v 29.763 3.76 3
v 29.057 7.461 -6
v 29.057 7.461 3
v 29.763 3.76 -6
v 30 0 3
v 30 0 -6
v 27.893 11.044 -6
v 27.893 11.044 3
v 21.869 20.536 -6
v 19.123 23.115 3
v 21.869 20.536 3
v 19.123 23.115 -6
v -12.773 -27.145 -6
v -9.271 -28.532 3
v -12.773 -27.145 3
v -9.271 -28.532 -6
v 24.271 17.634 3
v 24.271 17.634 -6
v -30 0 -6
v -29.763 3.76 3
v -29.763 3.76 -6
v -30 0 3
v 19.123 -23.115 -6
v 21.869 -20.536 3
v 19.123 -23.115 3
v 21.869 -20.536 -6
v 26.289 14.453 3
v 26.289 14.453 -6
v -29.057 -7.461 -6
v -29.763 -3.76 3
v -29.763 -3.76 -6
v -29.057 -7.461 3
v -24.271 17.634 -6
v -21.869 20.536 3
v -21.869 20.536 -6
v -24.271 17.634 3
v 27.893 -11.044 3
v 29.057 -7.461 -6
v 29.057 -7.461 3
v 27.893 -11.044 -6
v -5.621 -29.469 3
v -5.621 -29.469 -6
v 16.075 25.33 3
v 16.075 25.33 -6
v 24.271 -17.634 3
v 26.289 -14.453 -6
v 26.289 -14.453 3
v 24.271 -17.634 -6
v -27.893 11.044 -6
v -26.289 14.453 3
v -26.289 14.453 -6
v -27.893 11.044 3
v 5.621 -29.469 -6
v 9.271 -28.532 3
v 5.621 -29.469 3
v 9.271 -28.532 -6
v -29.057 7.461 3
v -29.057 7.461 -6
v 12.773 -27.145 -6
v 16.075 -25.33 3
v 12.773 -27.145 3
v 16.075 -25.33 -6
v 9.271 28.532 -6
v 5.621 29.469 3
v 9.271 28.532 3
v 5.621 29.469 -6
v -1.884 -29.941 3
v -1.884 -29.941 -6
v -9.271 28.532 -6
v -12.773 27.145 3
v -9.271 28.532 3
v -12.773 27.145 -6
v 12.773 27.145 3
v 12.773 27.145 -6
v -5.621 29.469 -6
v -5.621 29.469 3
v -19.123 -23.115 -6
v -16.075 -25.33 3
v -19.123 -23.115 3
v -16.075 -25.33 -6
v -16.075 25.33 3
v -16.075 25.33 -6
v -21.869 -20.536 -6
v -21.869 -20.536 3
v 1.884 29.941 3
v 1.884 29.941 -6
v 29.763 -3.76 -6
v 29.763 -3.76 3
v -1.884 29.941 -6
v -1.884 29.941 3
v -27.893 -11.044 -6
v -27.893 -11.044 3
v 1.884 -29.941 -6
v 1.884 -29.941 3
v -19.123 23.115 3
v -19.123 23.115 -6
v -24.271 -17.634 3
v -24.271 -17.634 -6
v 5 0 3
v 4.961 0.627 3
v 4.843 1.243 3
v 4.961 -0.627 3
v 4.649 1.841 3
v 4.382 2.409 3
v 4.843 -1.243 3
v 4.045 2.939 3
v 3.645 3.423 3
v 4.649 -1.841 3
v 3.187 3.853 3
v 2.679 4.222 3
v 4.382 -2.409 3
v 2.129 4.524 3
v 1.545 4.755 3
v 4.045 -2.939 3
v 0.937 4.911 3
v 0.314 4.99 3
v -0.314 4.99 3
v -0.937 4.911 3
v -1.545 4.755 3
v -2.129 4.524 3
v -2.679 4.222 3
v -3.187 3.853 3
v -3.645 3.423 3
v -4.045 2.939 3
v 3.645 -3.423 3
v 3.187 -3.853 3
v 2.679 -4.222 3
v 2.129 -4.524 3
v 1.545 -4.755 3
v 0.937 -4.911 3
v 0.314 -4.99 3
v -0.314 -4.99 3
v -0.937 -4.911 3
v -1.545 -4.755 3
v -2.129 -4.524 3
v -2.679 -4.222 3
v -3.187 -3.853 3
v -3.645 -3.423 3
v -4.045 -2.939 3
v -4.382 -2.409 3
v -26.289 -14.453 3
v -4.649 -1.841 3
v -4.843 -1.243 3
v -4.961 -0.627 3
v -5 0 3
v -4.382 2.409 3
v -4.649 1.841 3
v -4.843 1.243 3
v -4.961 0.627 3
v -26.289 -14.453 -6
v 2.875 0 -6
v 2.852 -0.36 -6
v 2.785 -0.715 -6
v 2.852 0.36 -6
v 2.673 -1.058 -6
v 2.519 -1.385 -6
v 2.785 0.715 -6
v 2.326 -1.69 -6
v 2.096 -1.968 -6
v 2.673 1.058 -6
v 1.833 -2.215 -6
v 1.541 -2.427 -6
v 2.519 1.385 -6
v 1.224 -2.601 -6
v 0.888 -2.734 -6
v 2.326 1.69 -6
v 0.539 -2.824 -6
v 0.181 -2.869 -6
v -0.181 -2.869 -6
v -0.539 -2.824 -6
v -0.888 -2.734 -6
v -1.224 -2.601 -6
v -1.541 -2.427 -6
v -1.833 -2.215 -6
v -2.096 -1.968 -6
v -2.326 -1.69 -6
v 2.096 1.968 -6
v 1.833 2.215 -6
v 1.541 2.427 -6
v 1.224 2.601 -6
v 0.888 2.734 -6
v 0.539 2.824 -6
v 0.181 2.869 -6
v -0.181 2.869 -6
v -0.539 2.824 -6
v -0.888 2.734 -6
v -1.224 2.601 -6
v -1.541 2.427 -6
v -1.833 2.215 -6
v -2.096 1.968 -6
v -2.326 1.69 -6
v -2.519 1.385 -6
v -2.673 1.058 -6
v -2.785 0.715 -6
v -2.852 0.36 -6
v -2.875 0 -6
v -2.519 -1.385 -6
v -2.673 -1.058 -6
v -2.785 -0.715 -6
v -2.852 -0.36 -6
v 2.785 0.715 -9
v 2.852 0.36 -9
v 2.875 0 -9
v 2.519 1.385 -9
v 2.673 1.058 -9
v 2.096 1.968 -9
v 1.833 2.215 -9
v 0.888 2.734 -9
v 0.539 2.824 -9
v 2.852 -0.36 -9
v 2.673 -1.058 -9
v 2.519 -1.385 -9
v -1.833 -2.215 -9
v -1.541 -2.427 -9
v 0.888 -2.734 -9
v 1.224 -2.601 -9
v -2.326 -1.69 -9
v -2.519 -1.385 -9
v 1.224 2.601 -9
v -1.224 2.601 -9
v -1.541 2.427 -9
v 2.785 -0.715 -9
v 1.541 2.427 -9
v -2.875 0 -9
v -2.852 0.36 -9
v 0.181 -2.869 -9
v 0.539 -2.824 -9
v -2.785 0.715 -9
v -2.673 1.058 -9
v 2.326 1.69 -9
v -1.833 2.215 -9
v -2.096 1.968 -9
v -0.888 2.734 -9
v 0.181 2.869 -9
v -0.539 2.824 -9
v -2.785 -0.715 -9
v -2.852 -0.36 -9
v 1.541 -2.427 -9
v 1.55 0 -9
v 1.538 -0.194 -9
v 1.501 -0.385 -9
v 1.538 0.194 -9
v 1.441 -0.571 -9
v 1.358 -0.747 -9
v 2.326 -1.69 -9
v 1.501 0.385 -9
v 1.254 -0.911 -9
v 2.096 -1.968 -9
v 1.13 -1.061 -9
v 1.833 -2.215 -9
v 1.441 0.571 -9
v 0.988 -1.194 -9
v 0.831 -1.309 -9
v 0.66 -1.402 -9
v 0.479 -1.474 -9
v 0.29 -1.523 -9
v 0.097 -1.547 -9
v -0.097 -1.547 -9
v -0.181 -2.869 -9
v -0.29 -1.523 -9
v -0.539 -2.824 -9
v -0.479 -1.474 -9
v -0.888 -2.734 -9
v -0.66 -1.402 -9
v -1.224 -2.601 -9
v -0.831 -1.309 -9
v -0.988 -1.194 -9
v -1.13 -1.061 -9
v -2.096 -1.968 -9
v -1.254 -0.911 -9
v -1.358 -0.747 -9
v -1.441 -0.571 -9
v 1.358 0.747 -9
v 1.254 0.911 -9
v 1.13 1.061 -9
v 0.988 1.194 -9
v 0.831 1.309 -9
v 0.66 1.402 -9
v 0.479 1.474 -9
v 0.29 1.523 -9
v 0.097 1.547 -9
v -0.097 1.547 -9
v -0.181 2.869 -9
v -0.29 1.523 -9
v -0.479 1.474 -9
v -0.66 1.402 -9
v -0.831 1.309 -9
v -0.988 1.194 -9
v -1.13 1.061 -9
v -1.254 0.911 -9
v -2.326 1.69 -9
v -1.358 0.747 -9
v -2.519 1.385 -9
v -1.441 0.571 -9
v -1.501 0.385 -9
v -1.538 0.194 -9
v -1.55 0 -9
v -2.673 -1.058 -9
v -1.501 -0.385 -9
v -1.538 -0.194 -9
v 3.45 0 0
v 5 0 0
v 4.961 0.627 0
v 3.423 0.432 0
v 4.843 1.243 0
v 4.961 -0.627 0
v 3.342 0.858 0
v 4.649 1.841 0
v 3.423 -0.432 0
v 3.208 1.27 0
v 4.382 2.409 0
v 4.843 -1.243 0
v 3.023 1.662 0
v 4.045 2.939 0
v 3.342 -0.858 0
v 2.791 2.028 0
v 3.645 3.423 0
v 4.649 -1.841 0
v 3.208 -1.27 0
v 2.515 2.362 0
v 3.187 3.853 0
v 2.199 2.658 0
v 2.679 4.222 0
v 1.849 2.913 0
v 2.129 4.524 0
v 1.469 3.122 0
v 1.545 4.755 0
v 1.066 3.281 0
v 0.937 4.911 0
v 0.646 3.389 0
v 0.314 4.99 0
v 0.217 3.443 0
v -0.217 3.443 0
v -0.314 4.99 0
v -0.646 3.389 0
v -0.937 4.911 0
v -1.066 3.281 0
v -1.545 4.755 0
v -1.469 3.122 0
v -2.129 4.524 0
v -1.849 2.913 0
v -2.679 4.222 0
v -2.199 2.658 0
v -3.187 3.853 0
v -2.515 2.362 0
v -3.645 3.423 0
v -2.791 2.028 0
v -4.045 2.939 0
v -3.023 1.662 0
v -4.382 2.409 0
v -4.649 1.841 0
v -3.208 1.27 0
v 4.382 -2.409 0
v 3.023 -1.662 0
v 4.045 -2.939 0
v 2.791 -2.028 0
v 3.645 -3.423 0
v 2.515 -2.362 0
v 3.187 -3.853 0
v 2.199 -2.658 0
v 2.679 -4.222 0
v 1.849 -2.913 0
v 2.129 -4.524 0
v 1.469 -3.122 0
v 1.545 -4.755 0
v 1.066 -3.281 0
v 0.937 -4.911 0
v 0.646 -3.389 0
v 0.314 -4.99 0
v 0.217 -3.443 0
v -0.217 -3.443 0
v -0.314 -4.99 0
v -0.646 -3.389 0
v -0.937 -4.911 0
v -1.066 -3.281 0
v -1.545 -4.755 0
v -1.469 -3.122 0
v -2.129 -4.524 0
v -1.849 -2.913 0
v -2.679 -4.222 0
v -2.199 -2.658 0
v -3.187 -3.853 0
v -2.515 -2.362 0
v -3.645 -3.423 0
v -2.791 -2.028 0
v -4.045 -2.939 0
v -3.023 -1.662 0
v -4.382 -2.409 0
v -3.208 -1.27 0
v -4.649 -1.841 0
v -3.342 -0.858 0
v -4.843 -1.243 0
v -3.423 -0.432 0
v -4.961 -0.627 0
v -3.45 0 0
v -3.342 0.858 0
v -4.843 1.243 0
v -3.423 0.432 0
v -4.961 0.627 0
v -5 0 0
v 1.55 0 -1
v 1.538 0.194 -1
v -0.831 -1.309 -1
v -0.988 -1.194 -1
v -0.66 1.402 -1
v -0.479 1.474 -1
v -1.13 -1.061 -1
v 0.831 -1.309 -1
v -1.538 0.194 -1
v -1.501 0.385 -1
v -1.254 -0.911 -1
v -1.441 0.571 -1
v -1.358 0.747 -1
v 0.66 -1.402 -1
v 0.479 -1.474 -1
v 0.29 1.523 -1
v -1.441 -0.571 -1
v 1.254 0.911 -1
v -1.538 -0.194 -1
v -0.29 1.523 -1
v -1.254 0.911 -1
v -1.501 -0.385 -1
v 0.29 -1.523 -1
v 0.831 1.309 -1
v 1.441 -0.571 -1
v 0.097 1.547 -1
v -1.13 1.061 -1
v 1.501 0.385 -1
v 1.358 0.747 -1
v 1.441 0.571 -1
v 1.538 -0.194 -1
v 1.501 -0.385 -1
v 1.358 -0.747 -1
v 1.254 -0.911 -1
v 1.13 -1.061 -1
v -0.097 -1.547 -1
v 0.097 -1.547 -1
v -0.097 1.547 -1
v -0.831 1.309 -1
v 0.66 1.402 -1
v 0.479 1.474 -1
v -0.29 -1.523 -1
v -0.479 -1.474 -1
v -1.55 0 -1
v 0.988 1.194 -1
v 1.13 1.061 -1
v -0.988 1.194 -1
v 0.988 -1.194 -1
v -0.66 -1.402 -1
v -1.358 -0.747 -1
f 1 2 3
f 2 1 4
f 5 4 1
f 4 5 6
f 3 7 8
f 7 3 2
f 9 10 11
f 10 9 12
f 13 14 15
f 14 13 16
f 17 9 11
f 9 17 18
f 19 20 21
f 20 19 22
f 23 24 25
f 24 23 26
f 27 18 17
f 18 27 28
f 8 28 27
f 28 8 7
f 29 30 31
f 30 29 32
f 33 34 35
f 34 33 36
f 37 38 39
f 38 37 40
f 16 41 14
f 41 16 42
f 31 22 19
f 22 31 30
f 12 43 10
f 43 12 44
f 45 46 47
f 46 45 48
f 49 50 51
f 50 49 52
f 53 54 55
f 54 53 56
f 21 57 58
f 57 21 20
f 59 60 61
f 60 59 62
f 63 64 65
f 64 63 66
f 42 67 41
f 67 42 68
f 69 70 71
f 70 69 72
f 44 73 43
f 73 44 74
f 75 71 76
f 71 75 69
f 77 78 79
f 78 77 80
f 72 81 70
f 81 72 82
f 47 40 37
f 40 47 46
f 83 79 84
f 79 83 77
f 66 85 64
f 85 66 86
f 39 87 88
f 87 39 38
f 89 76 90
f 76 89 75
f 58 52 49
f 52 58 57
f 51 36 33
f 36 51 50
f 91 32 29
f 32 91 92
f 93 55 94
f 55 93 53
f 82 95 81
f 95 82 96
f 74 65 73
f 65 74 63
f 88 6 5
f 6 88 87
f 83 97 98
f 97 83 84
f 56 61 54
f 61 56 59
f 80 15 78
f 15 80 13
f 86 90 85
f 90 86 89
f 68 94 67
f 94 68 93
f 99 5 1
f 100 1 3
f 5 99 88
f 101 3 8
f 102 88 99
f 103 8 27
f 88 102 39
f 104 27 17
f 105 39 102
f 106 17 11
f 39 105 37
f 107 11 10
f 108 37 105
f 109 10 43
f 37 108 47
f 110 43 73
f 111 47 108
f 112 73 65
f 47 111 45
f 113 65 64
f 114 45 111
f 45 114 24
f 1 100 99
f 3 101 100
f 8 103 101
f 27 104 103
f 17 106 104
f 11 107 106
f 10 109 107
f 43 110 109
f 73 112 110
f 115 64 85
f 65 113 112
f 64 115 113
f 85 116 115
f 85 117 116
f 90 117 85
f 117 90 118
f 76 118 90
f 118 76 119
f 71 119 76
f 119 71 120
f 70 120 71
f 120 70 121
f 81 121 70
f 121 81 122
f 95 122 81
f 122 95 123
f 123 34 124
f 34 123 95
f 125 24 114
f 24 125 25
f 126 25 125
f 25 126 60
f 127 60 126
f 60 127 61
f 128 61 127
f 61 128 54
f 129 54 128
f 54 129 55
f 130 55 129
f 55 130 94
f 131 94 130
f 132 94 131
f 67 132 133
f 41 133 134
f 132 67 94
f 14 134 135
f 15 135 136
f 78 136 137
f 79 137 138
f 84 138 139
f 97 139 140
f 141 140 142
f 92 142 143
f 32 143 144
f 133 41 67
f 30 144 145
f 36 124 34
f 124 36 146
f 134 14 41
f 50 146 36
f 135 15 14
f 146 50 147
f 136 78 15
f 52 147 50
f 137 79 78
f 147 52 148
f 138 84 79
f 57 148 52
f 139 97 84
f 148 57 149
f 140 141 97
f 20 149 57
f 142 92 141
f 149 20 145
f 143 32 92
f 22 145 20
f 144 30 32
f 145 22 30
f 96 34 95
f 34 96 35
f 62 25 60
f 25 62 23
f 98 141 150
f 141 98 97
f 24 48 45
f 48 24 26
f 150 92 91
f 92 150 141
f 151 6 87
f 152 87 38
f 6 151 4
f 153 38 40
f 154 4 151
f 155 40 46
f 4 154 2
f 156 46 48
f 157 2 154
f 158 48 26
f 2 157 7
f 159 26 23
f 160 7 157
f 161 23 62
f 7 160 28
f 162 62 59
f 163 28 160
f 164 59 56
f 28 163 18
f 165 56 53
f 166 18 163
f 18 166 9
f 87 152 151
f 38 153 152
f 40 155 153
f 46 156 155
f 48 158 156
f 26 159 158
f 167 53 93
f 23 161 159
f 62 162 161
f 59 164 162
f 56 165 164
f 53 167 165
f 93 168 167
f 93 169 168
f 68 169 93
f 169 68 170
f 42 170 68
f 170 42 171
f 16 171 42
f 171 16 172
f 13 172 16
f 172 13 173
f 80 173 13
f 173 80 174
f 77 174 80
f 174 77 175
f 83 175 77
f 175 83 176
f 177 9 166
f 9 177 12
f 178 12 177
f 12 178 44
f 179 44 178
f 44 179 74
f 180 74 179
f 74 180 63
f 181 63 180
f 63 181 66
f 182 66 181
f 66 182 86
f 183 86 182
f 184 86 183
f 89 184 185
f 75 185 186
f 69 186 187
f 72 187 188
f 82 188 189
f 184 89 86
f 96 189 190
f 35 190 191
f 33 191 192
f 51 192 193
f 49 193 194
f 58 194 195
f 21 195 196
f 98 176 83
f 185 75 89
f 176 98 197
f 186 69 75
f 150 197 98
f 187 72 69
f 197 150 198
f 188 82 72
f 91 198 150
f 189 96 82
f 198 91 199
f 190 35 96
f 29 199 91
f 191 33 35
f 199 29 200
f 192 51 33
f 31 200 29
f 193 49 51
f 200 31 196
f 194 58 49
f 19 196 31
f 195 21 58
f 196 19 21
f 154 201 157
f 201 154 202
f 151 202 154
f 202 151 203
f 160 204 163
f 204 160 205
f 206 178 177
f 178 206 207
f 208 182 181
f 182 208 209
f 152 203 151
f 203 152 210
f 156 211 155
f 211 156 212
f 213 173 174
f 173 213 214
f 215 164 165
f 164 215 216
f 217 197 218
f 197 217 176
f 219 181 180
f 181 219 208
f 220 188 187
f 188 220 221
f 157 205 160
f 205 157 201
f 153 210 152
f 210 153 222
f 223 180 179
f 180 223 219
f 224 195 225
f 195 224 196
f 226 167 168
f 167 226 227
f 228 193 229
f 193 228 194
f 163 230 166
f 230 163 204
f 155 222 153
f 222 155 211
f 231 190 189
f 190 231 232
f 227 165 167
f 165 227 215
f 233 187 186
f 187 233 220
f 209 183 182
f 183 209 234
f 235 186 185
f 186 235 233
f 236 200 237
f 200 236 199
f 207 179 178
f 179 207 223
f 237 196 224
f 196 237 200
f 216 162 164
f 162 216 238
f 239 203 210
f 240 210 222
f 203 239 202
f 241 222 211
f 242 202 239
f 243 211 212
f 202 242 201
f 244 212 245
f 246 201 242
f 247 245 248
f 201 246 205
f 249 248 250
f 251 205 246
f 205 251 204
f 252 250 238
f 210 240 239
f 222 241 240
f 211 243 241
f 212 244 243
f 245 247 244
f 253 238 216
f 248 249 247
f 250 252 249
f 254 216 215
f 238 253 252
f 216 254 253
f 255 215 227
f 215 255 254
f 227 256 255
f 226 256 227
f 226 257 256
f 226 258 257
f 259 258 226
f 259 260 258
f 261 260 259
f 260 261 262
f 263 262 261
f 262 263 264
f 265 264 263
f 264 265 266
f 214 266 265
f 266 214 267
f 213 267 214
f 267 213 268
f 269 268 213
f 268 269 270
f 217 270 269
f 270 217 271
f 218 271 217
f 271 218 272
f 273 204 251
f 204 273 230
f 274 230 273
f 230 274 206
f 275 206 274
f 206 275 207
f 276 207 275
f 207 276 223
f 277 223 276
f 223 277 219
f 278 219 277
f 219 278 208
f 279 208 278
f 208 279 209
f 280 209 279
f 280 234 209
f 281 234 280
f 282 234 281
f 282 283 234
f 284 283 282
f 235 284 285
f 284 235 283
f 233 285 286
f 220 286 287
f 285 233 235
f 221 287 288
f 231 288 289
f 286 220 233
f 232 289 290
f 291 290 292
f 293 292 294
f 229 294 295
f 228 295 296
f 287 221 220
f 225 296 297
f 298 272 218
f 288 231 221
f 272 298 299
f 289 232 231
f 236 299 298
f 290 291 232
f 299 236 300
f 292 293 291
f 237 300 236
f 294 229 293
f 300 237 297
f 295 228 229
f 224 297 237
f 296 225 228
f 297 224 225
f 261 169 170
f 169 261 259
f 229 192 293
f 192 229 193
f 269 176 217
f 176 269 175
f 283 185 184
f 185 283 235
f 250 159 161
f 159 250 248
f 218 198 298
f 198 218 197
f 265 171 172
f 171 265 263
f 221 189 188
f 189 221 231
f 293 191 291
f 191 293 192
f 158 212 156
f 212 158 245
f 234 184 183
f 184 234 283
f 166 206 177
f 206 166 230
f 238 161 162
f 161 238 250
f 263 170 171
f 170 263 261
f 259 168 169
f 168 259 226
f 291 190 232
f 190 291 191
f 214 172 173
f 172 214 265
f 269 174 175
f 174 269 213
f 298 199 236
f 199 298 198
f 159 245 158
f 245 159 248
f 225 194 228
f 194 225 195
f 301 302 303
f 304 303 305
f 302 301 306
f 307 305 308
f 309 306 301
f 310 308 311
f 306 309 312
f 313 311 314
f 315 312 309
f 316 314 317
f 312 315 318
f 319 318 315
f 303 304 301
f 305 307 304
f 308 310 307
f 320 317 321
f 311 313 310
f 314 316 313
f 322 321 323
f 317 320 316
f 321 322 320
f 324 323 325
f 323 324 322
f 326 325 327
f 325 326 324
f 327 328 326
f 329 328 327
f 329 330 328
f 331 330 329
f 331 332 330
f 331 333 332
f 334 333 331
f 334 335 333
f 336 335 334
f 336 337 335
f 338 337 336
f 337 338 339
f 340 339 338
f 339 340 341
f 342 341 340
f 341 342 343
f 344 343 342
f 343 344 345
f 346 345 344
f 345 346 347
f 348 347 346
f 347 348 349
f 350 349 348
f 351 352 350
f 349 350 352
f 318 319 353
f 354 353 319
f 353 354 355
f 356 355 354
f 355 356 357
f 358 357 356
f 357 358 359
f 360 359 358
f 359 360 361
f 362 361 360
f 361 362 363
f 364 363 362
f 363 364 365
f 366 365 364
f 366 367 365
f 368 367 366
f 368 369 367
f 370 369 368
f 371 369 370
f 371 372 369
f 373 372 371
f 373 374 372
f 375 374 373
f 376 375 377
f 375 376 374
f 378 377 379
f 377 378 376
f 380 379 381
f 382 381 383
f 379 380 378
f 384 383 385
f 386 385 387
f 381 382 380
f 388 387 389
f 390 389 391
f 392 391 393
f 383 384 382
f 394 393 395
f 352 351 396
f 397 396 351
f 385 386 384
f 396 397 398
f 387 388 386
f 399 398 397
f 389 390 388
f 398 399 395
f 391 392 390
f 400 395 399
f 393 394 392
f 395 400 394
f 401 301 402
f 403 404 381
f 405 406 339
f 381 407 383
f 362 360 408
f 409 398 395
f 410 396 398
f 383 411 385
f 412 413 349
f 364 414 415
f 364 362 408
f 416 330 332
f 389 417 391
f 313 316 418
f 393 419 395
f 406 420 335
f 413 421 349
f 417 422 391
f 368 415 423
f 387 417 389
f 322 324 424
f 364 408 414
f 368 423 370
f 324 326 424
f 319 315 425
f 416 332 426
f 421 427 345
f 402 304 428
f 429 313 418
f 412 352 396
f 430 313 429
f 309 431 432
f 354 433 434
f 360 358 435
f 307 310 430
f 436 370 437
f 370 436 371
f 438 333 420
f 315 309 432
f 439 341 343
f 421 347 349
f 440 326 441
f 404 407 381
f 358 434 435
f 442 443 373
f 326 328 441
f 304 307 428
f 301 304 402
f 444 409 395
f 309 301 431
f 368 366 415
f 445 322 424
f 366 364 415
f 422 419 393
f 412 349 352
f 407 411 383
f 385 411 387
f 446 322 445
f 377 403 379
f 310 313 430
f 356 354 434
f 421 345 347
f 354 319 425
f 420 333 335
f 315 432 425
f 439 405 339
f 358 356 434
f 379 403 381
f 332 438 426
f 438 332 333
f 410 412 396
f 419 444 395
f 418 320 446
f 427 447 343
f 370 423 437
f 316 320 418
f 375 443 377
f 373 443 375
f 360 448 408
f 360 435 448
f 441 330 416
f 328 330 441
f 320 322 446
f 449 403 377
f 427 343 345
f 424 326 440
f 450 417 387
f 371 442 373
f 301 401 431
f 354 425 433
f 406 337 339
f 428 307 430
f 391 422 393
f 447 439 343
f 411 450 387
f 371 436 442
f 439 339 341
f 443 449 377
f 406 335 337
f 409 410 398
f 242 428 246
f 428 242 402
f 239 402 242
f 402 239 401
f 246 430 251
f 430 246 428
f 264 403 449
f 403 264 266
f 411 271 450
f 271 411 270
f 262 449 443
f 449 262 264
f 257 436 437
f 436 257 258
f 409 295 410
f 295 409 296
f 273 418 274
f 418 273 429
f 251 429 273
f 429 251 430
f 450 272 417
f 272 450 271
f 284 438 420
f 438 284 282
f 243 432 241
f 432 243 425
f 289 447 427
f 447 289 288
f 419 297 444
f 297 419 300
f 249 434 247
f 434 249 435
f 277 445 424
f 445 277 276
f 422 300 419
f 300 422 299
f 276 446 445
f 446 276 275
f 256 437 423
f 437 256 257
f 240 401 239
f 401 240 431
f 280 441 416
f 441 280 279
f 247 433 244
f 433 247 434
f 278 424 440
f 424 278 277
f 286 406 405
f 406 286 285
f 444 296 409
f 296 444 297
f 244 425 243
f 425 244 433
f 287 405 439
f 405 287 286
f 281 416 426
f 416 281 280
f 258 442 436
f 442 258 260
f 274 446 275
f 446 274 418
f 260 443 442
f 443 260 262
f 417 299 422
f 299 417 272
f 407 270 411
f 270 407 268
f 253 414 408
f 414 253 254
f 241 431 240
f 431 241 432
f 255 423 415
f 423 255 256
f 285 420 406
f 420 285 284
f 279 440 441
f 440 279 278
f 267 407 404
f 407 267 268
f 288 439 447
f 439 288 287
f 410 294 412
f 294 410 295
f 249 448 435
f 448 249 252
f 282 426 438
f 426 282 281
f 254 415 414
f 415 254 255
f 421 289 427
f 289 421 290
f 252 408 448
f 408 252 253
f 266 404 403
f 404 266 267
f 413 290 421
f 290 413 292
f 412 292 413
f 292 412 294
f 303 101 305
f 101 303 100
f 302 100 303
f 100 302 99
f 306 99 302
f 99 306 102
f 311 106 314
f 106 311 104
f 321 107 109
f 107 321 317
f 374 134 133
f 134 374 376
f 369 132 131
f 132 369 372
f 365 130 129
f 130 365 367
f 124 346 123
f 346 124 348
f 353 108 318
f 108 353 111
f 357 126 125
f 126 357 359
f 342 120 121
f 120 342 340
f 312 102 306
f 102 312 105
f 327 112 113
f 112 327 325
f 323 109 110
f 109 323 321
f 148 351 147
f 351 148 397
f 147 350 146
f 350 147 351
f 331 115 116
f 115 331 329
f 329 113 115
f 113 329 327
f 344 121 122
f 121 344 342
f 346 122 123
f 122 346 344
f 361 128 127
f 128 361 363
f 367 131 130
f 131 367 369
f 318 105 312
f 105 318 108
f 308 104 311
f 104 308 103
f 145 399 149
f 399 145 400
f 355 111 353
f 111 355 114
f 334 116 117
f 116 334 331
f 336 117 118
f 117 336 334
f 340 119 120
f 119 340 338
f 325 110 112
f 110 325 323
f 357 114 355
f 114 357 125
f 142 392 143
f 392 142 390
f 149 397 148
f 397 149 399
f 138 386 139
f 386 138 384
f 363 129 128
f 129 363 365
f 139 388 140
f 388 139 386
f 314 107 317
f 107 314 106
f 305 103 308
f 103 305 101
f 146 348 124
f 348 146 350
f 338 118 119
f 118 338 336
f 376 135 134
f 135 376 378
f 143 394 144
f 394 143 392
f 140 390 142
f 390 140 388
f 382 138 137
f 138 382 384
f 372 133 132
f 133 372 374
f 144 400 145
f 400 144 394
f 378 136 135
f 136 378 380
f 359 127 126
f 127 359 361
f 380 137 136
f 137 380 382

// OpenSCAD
$fn = 50;


difference() {
	union() {
		translate(v = [0, 0, -6.0000000000]) {
			cylinder(h = 9, r = 30.0000000000);
		}
		#translate(v = [0, 0, -9.0000000000]) {
			cylinder(h = 9, r = 2.8750000000);
		}
	}
	union() {
		translate(v = [0, 0, 0]) {
			rotate(a = [0, 0, 0]) {
				difference() {
					union() {
						translate(v = [0, 0, -9.0000000000]) {
							cylinder(h = 9, r = 1.2500000000);
						}
						translate(v = [0, 0, -1.0000000000]) {
							cylinder(h = 1.0000000000, r1 = 1.5500000000, r2 = 3.4500000000);
						}
						translate(v = [0, 0, -9.0000000000]) {
							cylinder(h = 9, r = 1.5500000000);
						}
						translate(v = [0, 0, -9.0000000000]) {
							cylinder(h = 9, r = 1.2500000000);
						}
					}
					union();
				}
			}
		}
		#cylinder(h = 3, r = 5.0000000000);
	}
}
